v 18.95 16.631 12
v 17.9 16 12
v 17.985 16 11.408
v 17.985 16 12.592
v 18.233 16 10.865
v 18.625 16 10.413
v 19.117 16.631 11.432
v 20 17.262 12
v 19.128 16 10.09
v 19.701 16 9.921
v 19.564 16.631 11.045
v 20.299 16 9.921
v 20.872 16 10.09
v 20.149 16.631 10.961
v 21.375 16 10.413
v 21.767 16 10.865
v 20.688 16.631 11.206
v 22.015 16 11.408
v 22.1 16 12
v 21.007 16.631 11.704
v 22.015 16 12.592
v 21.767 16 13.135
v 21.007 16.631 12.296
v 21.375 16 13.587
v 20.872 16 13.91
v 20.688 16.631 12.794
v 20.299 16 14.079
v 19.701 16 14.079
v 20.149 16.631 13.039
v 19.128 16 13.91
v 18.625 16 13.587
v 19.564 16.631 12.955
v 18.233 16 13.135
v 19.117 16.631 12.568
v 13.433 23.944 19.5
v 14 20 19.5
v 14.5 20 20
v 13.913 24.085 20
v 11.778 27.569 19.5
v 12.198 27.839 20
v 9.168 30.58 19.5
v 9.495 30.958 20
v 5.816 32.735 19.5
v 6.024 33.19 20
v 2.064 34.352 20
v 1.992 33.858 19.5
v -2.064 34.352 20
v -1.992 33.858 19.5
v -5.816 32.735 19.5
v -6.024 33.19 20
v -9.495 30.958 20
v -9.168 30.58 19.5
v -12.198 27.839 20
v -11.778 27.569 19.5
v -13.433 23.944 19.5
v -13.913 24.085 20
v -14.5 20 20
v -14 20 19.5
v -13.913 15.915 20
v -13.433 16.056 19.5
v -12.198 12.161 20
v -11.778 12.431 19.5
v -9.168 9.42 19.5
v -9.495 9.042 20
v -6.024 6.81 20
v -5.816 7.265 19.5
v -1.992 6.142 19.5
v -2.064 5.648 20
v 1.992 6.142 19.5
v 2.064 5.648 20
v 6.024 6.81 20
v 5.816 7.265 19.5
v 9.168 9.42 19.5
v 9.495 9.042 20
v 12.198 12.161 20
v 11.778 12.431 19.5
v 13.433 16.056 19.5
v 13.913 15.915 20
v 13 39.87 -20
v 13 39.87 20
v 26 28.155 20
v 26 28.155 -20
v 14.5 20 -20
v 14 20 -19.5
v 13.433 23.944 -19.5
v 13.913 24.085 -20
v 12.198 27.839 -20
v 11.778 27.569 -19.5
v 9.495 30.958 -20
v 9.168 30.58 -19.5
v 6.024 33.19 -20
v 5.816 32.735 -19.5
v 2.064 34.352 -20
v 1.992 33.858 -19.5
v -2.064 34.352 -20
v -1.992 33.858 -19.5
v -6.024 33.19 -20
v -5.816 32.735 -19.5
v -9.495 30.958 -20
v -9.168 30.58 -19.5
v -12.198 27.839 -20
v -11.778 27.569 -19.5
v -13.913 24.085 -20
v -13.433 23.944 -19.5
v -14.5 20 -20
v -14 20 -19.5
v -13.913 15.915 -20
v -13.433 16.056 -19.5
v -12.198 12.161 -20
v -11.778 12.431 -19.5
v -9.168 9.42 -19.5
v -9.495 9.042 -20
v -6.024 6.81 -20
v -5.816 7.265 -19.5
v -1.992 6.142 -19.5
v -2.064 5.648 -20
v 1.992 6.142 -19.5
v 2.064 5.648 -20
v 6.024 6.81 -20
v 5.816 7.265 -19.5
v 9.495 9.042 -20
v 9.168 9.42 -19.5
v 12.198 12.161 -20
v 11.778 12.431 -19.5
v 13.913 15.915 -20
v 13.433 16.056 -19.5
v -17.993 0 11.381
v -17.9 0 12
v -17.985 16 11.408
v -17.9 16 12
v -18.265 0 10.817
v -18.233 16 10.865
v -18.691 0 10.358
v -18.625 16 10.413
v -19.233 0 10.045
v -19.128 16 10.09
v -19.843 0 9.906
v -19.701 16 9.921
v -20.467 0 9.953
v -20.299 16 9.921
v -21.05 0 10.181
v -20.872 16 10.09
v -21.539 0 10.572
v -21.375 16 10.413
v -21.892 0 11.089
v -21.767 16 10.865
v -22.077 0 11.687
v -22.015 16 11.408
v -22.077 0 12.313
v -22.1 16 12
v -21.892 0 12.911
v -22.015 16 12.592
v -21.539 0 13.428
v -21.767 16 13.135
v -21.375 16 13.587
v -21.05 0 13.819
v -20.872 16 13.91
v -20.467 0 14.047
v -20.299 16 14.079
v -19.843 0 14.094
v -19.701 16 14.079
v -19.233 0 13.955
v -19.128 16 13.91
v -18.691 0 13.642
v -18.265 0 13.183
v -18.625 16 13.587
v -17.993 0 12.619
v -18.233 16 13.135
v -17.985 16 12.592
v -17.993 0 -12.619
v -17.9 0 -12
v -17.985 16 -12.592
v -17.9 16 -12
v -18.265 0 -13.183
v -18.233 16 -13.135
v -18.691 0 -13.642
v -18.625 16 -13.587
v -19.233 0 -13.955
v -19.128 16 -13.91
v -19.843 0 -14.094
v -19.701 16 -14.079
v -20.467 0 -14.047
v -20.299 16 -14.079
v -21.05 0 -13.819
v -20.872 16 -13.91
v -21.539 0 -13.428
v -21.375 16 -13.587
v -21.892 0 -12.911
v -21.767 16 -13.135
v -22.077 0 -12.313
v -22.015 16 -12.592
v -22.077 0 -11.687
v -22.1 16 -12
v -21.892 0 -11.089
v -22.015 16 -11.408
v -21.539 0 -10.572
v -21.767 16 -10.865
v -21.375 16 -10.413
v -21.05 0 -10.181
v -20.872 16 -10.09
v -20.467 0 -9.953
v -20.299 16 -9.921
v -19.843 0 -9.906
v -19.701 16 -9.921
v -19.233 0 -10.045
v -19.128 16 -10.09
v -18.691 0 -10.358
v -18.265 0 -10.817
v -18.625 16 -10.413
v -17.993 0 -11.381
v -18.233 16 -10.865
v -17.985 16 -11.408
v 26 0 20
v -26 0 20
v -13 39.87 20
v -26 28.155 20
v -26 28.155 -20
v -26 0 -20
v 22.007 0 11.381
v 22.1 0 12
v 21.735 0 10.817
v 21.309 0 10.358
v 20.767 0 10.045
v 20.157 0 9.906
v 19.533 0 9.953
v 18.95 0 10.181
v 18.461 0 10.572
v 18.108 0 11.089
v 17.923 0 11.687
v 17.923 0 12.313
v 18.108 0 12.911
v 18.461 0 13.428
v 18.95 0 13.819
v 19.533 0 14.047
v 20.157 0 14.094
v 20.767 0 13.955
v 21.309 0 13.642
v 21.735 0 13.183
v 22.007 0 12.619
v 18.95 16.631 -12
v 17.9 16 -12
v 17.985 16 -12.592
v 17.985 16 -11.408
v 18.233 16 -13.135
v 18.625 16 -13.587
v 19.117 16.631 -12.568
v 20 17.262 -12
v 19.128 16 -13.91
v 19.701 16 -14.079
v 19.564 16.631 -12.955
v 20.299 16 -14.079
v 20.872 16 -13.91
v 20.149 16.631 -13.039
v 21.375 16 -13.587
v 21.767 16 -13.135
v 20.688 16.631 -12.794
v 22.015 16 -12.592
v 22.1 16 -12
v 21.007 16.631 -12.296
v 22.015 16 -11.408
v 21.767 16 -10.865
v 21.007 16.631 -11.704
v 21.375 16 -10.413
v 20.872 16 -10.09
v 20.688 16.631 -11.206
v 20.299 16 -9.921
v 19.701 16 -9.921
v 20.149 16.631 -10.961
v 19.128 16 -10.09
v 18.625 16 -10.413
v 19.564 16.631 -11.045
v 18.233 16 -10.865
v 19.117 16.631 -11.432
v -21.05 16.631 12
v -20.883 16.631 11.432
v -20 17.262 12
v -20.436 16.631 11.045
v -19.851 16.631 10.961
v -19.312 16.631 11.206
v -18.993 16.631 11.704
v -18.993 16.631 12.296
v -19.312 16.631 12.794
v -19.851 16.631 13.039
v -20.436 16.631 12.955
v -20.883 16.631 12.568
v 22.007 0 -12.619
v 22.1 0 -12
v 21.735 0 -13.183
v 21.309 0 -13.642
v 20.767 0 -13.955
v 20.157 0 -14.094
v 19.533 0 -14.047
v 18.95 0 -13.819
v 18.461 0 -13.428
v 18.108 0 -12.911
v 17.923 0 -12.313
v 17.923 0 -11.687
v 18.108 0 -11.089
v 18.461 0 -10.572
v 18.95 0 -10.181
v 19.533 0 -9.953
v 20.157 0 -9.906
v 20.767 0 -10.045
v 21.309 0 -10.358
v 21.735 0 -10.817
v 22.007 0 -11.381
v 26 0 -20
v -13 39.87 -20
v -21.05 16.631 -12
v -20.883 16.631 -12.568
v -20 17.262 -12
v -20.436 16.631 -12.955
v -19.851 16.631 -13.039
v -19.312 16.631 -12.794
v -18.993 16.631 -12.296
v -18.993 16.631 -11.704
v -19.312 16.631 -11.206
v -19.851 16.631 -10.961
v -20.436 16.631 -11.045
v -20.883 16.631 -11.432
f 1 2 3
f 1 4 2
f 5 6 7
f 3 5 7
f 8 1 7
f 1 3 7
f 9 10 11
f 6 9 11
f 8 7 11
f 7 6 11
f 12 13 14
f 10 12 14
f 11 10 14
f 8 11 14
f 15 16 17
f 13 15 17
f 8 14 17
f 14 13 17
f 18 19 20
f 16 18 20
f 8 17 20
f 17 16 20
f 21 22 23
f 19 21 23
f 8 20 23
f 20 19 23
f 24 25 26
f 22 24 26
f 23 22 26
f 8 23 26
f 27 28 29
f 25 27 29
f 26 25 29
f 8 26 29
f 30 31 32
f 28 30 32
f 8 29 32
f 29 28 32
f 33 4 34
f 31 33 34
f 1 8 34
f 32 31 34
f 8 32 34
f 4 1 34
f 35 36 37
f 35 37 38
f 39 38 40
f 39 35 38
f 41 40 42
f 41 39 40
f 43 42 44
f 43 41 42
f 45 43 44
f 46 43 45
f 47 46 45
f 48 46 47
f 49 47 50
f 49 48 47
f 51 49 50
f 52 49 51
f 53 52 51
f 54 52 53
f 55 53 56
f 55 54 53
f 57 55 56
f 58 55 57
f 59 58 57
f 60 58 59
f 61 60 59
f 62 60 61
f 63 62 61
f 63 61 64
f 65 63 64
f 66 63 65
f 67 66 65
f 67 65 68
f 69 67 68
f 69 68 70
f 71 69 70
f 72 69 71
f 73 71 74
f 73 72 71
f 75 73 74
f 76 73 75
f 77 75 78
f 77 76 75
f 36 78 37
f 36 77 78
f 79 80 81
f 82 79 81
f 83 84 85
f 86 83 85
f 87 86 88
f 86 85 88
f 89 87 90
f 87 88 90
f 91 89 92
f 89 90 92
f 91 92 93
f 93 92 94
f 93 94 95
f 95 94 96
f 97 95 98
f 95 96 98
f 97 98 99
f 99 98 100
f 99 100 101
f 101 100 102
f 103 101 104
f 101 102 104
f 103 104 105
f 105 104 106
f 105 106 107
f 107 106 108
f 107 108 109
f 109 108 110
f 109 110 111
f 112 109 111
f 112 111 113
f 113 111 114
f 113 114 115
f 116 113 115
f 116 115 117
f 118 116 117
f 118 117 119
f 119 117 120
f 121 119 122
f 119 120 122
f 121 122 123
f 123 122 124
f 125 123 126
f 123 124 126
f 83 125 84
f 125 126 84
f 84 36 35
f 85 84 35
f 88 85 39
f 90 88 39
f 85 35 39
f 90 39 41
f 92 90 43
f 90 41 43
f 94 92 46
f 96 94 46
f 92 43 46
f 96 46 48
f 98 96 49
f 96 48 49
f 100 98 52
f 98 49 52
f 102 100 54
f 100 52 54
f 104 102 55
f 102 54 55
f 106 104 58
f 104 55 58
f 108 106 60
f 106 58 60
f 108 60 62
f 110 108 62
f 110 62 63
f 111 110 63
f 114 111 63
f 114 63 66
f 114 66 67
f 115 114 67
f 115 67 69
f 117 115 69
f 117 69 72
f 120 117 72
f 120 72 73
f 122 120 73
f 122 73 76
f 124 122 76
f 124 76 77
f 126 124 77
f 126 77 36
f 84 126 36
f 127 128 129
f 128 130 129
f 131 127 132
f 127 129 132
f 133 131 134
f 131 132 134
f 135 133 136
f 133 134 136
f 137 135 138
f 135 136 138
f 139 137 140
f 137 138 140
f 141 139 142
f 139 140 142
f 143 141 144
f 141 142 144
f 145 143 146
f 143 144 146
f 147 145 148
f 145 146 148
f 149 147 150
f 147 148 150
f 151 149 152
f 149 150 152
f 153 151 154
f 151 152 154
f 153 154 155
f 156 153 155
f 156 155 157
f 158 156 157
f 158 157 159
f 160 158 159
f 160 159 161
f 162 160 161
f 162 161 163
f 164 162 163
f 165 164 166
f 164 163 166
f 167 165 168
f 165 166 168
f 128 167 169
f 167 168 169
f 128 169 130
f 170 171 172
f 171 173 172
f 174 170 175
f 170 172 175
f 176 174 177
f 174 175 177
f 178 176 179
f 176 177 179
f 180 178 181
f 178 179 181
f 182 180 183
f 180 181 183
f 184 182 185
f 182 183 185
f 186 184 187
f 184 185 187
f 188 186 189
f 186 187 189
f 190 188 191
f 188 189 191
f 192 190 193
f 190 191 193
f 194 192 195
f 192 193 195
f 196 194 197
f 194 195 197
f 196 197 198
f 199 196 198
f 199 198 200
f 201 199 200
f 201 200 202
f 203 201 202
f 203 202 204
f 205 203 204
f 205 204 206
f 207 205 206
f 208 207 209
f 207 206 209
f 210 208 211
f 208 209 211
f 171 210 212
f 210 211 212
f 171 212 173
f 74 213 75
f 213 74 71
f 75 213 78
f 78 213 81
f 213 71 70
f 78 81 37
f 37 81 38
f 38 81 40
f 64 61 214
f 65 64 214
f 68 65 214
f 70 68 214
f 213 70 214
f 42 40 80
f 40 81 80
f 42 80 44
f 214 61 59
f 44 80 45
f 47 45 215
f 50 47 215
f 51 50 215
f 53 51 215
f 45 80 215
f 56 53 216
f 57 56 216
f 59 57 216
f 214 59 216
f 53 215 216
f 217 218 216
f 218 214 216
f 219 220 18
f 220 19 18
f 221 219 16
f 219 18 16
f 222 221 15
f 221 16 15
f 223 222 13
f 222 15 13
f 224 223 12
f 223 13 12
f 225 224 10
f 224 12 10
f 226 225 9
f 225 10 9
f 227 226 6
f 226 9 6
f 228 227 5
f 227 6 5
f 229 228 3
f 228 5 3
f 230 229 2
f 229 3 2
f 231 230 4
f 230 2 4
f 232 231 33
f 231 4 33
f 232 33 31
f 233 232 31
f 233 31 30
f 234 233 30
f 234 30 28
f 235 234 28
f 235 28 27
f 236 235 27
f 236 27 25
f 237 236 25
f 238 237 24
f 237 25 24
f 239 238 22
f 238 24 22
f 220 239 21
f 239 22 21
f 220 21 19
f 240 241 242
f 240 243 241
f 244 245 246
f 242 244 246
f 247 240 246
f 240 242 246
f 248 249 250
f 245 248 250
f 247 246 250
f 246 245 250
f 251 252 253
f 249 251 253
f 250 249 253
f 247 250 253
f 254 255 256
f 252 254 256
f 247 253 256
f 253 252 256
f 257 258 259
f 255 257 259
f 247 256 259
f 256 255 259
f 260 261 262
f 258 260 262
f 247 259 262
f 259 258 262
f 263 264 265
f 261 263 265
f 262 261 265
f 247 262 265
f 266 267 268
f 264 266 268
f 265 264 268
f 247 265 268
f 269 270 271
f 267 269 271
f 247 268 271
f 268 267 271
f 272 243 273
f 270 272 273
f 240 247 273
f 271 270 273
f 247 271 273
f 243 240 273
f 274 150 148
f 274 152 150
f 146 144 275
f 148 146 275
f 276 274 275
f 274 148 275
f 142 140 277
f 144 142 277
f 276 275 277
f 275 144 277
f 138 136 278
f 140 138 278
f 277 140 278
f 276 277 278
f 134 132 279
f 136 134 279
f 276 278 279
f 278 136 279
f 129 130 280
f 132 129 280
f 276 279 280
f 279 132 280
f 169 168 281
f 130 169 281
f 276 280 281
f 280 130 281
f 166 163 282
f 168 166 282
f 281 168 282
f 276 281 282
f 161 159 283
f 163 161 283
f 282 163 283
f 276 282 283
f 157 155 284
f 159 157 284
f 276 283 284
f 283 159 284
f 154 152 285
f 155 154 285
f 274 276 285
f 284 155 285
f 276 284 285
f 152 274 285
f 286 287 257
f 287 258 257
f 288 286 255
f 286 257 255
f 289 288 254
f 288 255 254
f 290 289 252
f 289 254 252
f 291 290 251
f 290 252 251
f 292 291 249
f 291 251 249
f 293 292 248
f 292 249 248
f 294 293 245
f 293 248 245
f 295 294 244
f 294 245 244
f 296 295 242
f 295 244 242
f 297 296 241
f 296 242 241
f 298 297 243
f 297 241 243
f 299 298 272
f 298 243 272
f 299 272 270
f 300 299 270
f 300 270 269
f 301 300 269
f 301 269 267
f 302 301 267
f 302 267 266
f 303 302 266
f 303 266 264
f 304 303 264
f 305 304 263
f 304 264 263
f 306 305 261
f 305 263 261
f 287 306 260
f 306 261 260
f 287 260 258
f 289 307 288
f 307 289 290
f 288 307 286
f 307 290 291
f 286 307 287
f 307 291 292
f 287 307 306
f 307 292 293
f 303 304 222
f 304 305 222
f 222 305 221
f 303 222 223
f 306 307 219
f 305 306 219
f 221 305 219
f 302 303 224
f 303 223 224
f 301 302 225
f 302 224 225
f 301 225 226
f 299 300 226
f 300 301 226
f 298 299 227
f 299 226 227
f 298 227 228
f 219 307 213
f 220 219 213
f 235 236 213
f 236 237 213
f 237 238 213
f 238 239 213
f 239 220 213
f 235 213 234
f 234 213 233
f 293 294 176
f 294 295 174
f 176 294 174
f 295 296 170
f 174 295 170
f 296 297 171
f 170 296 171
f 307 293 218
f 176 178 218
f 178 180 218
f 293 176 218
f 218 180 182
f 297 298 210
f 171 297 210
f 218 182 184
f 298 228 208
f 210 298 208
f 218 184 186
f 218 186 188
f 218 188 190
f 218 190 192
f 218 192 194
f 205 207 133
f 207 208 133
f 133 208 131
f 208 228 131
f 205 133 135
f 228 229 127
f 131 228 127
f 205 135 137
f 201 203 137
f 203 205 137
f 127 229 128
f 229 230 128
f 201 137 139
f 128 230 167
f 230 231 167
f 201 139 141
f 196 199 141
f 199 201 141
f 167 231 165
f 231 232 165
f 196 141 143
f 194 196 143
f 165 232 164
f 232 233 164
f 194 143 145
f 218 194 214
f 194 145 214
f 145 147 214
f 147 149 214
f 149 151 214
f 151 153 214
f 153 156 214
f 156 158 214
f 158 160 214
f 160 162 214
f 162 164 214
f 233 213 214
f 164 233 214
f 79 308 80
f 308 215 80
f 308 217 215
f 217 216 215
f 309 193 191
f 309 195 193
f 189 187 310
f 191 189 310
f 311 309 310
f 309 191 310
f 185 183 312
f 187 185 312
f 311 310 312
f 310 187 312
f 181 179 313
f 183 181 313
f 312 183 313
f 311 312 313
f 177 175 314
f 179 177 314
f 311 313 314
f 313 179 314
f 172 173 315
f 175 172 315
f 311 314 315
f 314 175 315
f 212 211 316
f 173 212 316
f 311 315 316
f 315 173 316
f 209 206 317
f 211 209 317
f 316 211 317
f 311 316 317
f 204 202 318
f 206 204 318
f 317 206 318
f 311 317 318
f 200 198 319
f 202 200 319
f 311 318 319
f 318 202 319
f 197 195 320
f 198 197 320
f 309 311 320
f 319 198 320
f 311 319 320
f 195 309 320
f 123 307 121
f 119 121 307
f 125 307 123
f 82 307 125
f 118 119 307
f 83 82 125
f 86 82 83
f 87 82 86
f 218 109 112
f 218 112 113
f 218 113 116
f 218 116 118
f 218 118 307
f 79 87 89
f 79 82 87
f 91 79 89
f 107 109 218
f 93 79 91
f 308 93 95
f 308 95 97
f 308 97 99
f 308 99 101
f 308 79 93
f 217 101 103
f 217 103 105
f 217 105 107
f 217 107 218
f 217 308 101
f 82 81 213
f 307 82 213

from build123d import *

# Parameters (mm, degrees)
SALIENTE_EXTRUIR1_DEPTH       = 20
CROQUIS2_R                    = 14
CORTAR_EXTRUIR1_DEPTH         = 63.174085438
CHAFL_N1_SIZE                 = 0.5
TALADRO_ROSCADO_M5X0_81_D     = 4.2
TALADRO_ROSCADO_M5X0_81_DEPTH = 16
TALADRO_ROSCADO_M5X0_81_TIP   = 1.2618073


with BuildPart() as part:
    # Croquis1 → Saliente-Extruir1 (new, symmetric)
    with BuildSketch(Plane.XY):
        Polygon((26, 0), (-26, 0), (-26, 28.154625486), (-13, 39.87), (13, 39.87), (26, 28.154625486), align=None)
    extrude(amount=SALIENTE_EXTRUIR1_DEPTH, both=True)

    # Croquis2 → Cortar-Extruir1 (cut, through all)
    with BuildSketch(Plane.XY.offset(20)):
        with Locations((0, 20)):
            Circle(CROQUIS2_R)
    extrude(amount=-CORTAR_EXTRUIR1_DEPTH, mode=Mode.SUBTRACT)

    # Chaflán1
    chafl_n1_edges = [part.edges().sort_by_distance(p)[0] for p in [
        (-14, 20, -20),
        (-14, 20, 20),
    ]]
    chamfer(chafl_n1_edges, length=CHAFL_N1_SIZE)

    # Taladro roscado M5x0.81
    with Locations(Plane(origin=(0, 0, 0), x_dir=(-1, 0, 0), z_dir=(0, -1, 0))):
        with Locations((-20, -12), (20, -12), (20, 12), (-20, 12)):
            Hole(TALADRO_ROSCADO_M5X0_81_D / 2, depth=TALADRO_ROSCADO_M5X0_81_DEPTH)
            with Locations((0, 0, -(TALADRO_ROSCADO_M5X0_81_DEPTH + TALADRO_ROSCADO_M5X0_81_TIP / 2))):  # 118° drill point
                Cone(0, TALADRO_ROSCADO_M5X0_81_D / 2, TALADRO_ROSCADO_M5X0_81_TIP, mode=Mode.SUBTRACT)


solid = part.part
